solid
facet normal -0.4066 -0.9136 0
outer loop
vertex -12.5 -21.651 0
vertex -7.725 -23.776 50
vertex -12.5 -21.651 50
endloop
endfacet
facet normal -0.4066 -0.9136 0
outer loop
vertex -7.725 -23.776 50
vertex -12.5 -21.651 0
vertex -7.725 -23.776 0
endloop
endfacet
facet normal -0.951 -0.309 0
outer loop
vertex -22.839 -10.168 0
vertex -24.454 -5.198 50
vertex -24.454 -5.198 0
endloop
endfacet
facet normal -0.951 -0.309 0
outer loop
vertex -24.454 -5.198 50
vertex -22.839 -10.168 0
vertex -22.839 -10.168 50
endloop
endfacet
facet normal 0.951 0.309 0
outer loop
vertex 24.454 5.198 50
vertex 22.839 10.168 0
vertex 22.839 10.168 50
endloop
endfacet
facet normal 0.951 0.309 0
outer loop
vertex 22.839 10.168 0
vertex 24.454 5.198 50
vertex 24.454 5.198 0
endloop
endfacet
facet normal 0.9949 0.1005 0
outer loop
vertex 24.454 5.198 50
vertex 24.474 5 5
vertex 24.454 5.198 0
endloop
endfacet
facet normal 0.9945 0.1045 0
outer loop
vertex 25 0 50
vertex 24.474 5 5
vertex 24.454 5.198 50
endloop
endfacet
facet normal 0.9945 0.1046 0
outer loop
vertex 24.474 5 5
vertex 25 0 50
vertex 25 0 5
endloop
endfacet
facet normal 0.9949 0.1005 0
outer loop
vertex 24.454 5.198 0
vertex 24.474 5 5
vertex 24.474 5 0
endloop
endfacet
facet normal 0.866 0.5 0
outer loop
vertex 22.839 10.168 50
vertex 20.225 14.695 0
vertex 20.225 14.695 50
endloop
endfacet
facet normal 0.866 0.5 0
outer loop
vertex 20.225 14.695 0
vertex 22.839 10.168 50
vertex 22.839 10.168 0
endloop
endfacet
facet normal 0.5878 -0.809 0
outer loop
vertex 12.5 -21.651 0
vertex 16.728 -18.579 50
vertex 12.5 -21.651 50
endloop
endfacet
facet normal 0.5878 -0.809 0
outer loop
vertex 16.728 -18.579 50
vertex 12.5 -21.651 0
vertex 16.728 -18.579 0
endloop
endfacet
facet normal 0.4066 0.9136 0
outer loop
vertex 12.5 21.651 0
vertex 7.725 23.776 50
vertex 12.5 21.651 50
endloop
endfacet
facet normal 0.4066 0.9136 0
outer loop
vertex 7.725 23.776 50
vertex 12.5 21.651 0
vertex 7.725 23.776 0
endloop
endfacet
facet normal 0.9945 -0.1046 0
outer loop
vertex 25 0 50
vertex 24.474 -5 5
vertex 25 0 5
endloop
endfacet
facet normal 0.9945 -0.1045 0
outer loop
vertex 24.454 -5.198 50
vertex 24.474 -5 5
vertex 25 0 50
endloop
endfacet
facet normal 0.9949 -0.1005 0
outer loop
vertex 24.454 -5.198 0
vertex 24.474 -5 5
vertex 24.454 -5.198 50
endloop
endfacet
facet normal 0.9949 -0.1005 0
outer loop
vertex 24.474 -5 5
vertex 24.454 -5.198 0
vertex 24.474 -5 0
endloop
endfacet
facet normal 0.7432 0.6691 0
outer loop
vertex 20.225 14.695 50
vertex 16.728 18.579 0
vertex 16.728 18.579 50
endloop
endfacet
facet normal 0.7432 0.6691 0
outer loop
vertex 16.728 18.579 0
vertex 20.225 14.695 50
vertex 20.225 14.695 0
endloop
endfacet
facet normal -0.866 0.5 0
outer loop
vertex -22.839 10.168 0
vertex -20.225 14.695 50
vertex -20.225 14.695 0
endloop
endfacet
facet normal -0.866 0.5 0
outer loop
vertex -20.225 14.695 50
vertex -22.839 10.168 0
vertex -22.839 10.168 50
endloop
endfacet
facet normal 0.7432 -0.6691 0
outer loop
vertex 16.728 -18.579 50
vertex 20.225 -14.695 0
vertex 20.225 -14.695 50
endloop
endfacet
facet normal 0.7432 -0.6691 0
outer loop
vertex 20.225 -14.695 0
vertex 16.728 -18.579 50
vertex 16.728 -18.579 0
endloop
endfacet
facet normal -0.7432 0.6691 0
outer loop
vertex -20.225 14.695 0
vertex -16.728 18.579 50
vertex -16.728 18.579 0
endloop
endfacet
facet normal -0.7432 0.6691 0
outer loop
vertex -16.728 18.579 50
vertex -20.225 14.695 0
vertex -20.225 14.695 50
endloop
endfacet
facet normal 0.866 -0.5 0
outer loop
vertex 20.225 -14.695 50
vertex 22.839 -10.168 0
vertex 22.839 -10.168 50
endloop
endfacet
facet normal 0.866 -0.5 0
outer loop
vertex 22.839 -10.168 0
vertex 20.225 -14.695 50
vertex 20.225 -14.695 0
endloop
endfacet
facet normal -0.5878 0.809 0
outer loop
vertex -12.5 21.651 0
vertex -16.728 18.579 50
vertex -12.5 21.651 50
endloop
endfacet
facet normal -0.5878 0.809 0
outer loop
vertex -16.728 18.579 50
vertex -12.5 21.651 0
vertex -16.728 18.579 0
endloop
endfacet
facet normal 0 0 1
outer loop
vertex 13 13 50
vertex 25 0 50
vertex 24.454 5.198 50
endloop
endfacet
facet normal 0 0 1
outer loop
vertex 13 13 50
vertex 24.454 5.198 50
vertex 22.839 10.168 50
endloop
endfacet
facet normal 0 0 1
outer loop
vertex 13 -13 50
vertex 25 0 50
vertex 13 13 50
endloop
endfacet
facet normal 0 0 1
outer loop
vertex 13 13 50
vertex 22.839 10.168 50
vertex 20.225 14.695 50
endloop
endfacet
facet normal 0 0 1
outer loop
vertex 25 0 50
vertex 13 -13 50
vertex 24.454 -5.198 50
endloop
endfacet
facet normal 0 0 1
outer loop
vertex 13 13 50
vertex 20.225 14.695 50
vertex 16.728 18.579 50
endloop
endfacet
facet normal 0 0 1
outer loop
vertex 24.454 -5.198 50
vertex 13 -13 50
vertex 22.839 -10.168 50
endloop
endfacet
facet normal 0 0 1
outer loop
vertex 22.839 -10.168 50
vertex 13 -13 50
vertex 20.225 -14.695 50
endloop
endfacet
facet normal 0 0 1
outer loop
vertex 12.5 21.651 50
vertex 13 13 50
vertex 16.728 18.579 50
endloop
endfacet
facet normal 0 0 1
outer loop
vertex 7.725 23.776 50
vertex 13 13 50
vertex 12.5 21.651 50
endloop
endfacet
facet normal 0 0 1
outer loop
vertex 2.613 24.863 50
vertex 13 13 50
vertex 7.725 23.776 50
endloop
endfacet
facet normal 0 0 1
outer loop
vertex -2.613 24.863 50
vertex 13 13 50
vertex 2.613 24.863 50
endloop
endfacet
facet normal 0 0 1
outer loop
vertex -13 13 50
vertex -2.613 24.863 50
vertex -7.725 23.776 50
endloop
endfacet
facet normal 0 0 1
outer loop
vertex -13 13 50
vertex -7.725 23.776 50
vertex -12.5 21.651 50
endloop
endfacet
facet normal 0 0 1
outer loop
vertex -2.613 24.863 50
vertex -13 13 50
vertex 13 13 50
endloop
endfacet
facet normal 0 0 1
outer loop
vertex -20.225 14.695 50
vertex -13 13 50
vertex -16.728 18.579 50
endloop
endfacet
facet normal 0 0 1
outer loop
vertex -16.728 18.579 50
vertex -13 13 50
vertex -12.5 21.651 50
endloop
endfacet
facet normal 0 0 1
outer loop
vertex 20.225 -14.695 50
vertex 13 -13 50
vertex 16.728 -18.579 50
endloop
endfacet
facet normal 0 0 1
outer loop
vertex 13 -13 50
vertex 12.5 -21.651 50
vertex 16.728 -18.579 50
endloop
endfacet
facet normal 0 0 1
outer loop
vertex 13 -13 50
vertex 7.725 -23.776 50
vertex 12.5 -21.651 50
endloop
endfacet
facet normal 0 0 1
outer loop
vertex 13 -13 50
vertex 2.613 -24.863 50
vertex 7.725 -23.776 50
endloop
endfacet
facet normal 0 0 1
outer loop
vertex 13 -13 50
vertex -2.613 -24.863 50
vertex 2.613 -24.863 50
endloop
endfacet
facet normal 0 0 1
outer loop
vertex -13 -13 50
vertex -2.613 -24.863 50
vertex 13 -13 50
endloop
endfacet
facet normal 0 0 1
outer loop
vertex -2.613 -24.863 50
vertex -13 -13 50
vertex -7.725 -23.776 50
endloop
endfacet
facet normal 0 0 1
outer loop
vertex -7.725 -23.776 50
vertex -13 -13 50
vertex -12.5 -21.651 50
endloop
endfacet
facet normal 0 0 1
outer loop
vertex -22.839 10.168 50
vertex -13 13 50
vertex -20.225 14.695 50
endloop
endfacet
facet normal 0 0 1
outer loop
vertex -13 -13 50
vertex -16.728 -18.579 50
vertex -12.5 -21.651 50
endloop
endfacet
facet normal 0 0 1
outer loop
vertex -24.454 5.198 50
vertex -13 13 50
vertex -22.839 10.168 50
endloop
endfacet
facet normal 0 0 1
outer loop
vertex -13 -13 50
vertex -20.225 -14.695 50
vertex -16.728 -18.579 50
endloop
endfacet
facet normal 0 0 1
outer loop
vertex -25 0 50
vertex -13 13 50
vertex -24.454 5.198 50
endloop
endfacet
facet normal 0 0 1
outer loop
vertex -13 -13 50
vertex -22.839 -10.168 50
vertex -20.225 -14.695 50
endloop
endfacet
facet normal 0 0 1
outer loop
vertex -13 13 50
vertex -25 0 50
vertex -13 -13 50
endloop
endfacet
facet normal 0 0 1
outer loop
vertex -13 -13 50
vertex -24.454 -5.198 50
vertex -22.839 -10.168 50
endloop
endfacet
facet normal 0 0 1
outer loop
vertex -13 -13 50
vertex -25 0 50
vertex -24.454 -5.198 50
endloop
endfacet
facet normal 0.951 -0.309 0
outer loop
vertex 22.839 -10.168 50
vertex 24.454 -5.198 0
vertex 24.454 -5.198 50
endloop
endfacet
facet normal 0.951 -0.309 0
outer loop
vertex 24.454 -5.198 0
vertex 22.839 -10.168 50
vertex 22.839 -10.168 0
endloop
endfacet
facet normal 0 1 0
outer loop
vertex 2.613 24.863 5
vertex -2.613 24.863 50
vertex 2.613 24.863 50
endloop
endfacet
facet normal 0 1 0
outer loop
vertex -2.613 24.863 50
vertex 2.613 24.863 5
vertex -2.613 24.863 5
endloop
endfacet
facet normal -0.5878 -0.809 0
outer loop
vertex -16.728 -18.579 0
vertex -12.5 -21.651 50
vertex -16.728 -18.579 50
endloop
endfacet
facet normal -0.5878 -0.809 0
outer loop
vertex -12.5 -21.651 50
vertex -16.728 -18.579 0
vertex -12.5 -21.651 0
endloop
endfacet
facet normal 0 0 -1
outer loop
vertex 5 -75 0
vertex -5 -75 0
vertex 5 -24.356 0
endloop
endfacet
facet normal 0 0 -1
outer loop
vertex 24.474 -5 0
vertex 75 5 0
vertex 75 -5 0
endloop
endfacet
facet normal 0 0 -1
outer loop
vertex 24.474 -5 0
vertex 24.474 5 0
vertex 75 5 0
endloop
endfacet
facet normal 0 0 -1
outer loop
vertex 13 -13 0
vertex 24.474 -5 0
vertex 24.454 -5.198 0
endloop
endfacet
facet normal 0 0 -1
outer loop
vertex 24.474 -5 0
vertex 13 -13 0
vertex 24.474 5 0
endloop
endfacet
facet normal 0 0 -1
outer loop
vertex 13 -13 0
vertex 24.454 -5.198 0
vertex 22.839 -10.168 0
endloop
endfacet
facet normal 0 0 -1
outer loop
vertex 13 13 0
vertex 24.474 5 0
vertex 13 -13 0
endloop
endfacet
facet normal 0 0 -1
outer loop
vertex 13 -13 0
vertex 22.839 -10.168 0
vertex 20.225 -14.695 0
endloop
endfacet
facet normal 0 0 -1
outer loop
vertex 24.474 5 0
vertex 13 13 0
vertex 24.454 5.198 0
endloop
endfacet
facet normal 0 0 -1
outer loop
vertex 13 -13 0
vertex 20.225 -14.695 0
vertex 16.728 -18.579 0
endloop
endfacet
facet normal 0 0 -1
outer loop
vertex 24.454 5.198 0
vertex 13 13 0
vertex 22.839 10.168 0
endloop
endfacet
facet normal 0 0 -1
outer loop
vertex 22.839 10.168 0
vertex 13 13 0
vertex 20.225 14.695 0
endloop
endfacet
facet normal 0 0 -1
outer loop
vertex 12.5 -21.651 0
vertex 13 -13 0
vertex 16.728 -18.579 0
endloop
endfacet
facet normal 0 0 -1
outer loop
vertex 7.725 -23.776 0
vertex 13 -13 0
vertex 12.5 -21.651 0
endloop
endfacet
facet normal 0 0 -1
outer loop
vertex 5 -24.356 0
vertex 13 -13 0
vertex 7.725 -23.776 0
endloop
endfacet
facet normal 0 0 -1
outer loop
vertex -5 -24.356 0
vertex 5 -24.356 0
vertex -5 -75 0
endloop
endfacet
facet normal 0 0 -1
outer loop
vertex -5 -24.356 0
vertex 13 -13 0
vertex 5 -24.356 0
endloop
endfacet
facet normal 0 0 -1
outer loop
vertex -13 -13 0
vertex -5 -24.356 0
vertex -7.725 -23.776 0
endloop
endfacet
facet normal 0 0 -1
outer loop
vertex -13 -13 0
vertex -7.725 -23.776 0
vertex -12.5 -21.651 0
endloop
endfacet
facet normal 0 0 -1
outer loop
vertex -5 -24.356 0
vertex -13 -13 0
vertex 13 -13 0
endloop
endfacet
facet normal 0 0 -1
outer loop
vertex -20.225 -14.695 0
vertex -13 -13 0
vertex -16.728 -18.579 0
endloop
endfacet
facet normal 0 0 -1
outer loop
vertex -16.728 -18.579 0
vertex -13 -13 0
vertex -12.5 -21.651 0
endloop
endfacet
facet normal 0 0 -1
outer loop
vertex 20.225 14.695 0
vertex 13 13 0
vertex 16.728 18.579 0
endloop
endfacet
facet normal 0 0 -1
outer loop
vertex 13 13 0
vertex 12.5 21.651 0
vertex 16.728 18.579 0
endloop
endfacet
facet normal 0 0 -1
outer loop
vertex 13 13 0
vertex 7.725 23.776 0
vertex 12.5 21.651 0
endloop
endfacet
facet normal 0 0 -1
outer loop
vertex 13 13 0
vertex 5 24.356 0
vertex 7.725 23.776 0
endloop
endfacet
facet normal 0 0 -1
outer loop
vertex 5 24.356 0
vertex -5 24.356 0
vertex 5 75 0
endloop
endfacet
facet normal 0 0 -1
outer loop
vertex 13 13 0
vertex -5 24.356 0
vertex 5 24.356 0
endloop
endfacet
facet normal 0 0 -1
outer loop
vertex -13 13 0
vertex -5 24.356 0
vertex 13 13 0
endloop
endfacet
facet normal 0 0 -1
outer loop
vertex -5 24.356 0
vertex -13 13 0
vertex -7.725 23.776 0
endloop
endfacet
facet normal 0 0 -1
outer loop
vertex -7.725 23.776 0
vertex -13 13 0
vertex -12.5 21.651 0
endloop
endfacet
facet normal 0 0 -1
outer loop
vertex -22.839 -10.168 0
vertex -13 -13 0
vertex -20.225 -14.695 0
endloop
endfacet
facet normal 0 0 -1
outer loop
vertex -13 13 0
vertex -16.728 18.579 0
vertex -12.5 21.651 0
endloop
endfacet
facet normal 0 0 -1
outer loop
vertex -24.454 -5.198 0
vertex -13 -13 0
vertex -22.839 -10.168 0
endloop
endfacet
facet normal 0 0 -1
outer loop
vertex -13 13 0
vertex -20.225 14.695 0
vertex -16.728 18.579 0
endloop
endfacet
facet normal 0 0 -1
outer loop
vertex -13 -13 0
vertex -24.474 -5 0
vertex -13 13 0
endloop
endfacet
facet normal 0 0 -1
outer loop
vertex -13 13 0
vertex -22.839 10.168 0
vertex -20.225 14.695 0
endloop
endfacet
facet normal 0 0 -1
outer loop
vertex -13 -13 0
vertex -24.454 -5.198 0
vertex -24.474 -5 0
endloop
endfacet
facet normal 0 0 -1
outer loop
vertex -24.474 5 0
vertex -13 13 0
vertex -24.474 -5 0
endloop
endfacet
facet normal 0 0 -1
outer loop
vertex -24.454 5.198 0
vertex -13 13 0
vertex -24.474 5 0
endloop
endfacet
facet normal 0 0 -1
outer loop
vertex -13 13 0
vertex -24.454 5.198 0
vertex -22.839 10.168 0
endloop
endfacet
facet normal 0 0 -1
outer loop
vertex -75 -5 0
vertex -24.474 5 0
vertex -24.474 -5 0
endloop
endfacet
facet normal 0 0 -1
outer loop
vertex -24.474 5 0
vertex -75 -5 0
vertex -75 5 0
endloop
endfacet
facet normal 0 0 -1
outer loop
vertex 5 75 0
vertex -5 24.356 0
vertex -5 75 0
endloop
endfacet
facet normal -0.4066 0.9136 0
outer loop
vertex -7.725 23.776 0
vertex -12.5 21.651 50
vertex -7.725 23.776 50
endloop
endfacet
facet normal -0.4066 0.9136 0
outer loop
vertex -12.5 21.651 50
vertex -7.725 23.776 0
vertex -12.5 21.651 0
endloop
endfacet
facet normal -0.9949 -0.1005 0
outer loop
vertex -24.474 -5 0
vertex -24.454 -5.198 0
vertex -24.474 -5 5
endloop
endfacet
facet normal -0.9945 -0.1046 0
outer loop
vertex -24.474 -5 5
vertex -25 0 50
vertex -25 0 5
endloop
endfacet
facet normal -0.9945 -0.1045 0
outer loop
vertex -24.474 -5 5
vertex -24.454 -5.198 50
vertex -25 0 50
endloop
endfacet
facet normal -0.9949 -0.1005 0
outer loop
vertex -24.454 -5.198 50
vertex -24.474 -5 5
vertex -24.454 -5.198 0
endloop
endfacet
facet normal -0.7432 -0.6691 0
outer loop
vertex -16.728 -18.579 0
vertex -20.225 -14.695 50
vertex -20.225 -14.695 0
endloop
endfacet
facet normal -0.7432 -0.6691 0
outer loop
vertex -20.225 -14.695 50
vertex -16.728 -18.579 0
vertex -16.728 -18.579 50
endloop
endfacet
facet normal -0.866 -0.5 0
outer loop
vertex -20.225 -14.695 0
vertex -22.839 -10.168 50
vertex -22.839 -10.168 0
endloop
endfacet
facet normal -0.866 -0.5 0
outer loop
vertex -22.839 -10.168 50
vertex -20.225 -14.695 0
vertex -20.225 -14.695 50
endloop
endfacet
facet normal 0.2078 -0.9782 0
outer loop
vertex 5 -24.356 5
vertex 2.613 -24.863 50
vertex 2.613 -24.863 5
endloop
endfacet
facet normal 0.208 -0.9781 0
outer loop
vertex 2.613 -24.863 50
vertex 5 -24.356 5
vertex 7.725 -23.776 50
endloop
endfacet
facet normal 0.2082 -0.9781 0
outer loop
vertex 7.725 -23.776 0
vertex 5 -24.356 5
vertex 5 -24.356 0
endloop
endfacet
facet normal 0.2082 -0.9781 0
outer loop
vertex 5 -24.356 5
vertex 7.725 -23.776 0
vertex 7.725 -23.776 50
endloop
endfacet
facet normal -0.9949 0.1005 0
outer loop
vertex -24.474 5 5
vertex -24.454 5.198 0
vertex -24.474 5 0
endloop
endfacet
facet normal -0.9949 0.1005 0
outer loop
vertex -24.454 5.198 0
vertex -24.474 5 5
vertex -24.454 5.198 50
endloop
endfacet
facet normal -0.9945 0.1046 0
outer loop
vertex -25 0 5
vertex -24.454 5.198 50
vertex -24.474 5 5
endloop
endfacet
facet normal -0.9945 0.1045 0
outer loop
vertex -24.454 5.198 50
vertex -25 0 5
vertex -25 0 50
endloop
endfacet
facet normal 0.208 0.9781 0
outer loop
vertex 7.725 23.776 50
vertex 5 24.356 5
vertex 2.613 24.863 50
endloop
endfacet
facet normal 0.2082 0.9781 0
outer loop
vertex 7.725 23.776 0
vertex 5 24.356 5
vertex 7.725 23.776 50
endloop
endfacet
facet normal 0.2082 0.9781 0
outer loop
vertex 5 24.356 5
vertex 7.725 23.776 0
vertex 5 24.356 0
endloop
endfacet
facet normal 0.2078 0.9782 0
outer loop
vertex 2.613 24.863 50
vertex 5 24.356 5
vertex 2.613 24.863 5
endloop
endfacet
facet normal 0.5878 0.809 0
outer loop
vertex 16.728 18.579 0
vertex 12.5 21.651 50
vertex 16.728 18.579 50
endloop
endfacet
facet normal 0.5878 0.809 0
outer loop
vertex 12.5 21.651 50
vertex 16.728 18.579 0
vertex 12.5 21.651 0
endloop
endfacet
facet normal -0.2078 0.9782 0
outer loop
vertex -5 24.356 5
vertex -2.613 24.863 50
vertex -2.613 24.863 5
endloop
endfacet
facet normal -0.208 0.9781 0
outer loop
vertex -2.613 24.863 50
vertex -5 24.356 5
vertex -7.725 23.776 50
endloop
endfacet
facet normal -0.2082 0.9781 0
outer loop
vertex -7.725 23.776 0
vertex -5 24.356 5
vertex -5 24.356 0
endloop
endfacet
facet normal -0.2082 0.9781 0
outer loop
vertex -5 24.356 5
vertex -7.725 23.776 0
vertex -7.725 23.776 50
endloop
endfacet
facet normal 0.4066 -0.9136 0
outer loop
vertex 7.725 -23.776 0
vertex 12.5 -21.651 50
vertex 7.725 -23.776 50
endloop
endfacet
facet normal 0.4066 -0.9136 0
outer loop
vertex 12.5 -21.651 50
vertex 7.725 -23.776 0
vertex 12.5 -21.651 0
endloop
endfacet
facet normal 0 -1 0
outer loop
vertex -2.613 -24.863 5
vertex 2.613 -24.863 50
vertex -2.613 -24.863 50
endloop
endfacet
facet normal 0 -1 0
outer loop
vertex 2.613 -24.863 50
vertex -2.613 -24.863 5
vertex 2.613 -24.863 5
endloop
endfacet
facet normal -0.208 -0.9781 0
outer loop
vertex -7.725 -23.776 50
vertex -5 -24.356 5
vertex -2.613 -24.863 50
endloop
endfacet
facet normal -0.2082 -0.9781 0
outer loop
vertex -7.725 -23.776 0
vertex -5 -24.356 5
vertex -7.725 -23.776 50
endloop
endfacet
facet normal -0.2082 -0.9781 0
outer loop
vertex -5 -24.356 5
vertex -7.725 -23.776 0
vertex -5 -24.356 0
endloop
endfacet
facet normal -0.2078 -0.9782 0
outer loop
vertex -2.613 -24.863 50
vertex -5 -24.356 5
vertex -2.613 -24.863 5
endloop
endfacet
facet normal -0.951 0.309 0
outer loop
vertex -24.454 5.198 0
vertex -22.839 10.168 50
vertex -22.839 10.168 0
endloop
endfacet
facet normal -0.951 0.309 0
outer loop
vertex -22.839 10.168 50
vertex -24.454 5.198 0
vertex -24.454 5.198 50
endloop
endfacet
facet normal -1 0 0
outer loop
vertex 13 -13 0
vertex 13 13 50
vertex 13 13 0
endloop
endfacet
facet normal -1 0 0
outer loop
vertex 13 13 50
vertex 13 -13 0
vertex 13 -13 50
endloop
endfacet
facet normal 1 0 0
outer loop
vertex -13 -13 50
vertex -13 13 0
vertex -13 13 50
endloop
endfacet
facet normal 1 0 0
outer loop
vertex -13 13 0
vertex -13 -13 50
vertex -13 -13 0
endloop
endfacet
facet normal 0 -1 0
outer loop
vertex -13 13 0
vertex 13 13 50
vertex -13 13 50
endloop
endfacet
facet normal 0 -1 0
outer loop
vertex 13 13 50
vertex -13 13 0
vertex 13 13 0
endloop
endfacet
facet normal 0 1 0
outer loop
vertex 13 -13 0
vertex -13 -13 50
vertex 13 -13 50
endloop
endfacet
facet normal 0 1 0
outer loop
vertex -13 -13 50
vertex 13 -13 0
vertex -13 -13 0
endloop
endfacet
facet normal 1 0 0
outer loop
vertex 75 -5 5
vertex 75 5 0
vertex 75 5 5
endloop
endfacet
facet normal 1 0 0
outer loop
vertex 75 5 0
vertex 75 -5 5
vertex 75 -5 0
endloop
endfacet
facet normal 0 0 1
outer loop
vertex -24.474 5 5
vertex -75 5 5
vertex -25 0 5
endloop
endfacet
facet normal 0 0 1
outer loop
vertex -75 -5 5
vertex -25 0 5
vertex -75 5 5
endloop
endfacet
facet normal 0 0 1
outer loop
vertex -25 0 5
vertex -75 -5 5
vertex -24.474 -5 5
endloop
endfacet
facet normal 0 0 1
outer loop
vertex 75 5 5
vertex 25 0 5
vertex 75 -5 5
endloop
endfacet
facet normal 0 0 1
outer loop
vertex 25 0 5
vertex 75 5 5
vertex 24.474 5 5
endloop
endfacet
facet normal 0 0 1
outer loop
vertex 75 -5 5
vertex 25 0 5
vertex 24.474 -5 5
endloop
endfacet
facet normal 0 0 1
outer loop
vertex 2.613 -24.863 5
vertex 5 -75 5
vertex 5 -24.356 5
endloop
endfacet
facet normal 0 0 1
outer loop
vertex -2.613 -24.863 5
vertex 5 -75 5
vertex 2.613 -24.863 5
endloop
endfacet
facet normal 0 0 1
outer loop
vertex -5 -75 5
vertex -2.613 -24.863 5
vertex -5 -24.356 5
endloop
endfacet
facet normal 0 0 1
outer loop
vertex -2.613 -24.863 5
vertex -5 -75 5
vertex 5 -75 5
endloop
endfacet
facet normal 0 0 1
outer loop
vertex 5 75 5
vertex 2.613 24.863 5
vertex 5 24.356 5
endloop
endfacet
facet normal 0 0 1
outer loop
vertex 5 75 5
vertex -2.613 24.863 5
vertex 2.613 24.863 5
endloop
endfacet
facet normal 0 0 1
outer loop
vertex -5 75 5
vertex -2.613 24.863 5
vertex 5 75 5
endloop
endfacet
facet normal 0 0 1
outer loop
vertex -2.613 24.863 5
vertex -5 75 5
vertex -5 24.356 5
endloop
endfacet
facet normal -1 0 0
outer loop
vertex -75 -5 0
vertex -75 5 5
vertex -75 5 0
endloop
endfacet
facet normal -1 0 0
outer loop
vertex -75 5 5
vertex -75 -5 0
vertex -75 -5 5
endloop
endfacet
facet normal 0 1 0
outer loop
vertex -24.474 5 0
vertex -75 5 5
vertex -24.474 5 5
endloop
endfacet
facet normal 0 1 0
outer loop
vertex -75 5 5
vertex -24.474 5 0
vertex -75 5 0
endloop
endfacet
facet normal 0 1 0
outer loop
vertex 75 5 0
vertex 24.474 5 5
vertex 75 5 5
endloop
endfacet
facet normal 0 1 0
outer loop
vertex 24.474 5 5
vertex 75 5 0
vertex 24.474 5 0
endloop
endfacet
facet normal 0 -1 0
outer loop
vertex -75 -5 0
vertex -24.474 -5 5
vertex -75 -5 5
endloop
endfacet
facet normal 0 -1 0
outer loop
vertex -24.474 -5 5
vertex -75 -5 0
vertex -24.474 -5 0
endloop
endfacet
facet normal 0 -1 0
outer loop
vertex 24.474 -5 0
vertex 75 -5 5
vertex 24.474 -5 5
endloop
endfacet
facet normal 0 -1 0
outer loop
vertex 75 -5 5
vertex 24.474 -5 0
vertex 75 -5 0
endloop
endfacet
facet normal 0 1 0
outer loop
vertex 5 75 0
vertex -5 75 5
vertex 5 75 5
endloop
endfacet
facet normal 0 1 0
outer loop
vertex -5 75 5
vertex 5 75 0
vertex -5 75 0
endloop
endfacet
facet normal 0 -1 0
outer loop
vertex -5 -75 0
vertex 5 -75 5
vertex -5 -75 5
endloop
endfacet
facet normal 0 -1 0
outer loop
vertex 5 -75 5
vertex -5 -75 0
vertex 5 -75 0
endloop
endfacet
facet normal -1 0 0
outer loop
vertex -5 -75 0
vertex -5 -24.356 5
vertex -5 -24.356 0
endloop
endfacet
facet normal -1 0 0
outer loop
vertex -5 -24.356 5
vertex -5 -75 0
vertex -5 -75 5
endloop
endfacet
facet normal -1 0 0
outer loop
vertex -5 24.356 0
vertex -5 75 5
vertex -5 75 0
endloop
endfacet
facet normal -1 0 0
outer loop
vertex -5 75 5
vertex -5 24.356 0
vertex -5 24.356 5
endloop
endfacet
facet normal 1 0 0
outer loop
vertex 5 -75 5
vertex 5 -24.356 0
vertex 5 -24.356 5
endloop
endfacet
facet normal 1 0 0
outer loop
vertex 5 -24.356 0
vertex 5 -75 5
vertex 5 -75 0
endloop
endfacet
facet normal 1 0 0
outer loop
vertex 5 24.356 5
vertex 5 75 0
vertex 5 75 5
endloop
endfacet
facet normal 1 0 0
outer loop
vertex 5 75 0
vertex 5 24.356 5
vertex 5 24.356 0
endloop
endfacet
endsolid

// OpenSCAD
module body() {
	cylinder(r=25, h=50);
}
module foot() {
	translate([0,0,2.5]) cube([150,10,5], center=true);
	translate([0,0,2.5]) rotate(90) cube([150,10,5], center=true);
}
module holdingCutOut(height) {
	translate([0,0,-30]) cube([26, 26, height], center=true);
}

difference() {
	body();
	holdingCutOut(200);
}

difference() {
	foot();
	holdingCutOut(80);
}
